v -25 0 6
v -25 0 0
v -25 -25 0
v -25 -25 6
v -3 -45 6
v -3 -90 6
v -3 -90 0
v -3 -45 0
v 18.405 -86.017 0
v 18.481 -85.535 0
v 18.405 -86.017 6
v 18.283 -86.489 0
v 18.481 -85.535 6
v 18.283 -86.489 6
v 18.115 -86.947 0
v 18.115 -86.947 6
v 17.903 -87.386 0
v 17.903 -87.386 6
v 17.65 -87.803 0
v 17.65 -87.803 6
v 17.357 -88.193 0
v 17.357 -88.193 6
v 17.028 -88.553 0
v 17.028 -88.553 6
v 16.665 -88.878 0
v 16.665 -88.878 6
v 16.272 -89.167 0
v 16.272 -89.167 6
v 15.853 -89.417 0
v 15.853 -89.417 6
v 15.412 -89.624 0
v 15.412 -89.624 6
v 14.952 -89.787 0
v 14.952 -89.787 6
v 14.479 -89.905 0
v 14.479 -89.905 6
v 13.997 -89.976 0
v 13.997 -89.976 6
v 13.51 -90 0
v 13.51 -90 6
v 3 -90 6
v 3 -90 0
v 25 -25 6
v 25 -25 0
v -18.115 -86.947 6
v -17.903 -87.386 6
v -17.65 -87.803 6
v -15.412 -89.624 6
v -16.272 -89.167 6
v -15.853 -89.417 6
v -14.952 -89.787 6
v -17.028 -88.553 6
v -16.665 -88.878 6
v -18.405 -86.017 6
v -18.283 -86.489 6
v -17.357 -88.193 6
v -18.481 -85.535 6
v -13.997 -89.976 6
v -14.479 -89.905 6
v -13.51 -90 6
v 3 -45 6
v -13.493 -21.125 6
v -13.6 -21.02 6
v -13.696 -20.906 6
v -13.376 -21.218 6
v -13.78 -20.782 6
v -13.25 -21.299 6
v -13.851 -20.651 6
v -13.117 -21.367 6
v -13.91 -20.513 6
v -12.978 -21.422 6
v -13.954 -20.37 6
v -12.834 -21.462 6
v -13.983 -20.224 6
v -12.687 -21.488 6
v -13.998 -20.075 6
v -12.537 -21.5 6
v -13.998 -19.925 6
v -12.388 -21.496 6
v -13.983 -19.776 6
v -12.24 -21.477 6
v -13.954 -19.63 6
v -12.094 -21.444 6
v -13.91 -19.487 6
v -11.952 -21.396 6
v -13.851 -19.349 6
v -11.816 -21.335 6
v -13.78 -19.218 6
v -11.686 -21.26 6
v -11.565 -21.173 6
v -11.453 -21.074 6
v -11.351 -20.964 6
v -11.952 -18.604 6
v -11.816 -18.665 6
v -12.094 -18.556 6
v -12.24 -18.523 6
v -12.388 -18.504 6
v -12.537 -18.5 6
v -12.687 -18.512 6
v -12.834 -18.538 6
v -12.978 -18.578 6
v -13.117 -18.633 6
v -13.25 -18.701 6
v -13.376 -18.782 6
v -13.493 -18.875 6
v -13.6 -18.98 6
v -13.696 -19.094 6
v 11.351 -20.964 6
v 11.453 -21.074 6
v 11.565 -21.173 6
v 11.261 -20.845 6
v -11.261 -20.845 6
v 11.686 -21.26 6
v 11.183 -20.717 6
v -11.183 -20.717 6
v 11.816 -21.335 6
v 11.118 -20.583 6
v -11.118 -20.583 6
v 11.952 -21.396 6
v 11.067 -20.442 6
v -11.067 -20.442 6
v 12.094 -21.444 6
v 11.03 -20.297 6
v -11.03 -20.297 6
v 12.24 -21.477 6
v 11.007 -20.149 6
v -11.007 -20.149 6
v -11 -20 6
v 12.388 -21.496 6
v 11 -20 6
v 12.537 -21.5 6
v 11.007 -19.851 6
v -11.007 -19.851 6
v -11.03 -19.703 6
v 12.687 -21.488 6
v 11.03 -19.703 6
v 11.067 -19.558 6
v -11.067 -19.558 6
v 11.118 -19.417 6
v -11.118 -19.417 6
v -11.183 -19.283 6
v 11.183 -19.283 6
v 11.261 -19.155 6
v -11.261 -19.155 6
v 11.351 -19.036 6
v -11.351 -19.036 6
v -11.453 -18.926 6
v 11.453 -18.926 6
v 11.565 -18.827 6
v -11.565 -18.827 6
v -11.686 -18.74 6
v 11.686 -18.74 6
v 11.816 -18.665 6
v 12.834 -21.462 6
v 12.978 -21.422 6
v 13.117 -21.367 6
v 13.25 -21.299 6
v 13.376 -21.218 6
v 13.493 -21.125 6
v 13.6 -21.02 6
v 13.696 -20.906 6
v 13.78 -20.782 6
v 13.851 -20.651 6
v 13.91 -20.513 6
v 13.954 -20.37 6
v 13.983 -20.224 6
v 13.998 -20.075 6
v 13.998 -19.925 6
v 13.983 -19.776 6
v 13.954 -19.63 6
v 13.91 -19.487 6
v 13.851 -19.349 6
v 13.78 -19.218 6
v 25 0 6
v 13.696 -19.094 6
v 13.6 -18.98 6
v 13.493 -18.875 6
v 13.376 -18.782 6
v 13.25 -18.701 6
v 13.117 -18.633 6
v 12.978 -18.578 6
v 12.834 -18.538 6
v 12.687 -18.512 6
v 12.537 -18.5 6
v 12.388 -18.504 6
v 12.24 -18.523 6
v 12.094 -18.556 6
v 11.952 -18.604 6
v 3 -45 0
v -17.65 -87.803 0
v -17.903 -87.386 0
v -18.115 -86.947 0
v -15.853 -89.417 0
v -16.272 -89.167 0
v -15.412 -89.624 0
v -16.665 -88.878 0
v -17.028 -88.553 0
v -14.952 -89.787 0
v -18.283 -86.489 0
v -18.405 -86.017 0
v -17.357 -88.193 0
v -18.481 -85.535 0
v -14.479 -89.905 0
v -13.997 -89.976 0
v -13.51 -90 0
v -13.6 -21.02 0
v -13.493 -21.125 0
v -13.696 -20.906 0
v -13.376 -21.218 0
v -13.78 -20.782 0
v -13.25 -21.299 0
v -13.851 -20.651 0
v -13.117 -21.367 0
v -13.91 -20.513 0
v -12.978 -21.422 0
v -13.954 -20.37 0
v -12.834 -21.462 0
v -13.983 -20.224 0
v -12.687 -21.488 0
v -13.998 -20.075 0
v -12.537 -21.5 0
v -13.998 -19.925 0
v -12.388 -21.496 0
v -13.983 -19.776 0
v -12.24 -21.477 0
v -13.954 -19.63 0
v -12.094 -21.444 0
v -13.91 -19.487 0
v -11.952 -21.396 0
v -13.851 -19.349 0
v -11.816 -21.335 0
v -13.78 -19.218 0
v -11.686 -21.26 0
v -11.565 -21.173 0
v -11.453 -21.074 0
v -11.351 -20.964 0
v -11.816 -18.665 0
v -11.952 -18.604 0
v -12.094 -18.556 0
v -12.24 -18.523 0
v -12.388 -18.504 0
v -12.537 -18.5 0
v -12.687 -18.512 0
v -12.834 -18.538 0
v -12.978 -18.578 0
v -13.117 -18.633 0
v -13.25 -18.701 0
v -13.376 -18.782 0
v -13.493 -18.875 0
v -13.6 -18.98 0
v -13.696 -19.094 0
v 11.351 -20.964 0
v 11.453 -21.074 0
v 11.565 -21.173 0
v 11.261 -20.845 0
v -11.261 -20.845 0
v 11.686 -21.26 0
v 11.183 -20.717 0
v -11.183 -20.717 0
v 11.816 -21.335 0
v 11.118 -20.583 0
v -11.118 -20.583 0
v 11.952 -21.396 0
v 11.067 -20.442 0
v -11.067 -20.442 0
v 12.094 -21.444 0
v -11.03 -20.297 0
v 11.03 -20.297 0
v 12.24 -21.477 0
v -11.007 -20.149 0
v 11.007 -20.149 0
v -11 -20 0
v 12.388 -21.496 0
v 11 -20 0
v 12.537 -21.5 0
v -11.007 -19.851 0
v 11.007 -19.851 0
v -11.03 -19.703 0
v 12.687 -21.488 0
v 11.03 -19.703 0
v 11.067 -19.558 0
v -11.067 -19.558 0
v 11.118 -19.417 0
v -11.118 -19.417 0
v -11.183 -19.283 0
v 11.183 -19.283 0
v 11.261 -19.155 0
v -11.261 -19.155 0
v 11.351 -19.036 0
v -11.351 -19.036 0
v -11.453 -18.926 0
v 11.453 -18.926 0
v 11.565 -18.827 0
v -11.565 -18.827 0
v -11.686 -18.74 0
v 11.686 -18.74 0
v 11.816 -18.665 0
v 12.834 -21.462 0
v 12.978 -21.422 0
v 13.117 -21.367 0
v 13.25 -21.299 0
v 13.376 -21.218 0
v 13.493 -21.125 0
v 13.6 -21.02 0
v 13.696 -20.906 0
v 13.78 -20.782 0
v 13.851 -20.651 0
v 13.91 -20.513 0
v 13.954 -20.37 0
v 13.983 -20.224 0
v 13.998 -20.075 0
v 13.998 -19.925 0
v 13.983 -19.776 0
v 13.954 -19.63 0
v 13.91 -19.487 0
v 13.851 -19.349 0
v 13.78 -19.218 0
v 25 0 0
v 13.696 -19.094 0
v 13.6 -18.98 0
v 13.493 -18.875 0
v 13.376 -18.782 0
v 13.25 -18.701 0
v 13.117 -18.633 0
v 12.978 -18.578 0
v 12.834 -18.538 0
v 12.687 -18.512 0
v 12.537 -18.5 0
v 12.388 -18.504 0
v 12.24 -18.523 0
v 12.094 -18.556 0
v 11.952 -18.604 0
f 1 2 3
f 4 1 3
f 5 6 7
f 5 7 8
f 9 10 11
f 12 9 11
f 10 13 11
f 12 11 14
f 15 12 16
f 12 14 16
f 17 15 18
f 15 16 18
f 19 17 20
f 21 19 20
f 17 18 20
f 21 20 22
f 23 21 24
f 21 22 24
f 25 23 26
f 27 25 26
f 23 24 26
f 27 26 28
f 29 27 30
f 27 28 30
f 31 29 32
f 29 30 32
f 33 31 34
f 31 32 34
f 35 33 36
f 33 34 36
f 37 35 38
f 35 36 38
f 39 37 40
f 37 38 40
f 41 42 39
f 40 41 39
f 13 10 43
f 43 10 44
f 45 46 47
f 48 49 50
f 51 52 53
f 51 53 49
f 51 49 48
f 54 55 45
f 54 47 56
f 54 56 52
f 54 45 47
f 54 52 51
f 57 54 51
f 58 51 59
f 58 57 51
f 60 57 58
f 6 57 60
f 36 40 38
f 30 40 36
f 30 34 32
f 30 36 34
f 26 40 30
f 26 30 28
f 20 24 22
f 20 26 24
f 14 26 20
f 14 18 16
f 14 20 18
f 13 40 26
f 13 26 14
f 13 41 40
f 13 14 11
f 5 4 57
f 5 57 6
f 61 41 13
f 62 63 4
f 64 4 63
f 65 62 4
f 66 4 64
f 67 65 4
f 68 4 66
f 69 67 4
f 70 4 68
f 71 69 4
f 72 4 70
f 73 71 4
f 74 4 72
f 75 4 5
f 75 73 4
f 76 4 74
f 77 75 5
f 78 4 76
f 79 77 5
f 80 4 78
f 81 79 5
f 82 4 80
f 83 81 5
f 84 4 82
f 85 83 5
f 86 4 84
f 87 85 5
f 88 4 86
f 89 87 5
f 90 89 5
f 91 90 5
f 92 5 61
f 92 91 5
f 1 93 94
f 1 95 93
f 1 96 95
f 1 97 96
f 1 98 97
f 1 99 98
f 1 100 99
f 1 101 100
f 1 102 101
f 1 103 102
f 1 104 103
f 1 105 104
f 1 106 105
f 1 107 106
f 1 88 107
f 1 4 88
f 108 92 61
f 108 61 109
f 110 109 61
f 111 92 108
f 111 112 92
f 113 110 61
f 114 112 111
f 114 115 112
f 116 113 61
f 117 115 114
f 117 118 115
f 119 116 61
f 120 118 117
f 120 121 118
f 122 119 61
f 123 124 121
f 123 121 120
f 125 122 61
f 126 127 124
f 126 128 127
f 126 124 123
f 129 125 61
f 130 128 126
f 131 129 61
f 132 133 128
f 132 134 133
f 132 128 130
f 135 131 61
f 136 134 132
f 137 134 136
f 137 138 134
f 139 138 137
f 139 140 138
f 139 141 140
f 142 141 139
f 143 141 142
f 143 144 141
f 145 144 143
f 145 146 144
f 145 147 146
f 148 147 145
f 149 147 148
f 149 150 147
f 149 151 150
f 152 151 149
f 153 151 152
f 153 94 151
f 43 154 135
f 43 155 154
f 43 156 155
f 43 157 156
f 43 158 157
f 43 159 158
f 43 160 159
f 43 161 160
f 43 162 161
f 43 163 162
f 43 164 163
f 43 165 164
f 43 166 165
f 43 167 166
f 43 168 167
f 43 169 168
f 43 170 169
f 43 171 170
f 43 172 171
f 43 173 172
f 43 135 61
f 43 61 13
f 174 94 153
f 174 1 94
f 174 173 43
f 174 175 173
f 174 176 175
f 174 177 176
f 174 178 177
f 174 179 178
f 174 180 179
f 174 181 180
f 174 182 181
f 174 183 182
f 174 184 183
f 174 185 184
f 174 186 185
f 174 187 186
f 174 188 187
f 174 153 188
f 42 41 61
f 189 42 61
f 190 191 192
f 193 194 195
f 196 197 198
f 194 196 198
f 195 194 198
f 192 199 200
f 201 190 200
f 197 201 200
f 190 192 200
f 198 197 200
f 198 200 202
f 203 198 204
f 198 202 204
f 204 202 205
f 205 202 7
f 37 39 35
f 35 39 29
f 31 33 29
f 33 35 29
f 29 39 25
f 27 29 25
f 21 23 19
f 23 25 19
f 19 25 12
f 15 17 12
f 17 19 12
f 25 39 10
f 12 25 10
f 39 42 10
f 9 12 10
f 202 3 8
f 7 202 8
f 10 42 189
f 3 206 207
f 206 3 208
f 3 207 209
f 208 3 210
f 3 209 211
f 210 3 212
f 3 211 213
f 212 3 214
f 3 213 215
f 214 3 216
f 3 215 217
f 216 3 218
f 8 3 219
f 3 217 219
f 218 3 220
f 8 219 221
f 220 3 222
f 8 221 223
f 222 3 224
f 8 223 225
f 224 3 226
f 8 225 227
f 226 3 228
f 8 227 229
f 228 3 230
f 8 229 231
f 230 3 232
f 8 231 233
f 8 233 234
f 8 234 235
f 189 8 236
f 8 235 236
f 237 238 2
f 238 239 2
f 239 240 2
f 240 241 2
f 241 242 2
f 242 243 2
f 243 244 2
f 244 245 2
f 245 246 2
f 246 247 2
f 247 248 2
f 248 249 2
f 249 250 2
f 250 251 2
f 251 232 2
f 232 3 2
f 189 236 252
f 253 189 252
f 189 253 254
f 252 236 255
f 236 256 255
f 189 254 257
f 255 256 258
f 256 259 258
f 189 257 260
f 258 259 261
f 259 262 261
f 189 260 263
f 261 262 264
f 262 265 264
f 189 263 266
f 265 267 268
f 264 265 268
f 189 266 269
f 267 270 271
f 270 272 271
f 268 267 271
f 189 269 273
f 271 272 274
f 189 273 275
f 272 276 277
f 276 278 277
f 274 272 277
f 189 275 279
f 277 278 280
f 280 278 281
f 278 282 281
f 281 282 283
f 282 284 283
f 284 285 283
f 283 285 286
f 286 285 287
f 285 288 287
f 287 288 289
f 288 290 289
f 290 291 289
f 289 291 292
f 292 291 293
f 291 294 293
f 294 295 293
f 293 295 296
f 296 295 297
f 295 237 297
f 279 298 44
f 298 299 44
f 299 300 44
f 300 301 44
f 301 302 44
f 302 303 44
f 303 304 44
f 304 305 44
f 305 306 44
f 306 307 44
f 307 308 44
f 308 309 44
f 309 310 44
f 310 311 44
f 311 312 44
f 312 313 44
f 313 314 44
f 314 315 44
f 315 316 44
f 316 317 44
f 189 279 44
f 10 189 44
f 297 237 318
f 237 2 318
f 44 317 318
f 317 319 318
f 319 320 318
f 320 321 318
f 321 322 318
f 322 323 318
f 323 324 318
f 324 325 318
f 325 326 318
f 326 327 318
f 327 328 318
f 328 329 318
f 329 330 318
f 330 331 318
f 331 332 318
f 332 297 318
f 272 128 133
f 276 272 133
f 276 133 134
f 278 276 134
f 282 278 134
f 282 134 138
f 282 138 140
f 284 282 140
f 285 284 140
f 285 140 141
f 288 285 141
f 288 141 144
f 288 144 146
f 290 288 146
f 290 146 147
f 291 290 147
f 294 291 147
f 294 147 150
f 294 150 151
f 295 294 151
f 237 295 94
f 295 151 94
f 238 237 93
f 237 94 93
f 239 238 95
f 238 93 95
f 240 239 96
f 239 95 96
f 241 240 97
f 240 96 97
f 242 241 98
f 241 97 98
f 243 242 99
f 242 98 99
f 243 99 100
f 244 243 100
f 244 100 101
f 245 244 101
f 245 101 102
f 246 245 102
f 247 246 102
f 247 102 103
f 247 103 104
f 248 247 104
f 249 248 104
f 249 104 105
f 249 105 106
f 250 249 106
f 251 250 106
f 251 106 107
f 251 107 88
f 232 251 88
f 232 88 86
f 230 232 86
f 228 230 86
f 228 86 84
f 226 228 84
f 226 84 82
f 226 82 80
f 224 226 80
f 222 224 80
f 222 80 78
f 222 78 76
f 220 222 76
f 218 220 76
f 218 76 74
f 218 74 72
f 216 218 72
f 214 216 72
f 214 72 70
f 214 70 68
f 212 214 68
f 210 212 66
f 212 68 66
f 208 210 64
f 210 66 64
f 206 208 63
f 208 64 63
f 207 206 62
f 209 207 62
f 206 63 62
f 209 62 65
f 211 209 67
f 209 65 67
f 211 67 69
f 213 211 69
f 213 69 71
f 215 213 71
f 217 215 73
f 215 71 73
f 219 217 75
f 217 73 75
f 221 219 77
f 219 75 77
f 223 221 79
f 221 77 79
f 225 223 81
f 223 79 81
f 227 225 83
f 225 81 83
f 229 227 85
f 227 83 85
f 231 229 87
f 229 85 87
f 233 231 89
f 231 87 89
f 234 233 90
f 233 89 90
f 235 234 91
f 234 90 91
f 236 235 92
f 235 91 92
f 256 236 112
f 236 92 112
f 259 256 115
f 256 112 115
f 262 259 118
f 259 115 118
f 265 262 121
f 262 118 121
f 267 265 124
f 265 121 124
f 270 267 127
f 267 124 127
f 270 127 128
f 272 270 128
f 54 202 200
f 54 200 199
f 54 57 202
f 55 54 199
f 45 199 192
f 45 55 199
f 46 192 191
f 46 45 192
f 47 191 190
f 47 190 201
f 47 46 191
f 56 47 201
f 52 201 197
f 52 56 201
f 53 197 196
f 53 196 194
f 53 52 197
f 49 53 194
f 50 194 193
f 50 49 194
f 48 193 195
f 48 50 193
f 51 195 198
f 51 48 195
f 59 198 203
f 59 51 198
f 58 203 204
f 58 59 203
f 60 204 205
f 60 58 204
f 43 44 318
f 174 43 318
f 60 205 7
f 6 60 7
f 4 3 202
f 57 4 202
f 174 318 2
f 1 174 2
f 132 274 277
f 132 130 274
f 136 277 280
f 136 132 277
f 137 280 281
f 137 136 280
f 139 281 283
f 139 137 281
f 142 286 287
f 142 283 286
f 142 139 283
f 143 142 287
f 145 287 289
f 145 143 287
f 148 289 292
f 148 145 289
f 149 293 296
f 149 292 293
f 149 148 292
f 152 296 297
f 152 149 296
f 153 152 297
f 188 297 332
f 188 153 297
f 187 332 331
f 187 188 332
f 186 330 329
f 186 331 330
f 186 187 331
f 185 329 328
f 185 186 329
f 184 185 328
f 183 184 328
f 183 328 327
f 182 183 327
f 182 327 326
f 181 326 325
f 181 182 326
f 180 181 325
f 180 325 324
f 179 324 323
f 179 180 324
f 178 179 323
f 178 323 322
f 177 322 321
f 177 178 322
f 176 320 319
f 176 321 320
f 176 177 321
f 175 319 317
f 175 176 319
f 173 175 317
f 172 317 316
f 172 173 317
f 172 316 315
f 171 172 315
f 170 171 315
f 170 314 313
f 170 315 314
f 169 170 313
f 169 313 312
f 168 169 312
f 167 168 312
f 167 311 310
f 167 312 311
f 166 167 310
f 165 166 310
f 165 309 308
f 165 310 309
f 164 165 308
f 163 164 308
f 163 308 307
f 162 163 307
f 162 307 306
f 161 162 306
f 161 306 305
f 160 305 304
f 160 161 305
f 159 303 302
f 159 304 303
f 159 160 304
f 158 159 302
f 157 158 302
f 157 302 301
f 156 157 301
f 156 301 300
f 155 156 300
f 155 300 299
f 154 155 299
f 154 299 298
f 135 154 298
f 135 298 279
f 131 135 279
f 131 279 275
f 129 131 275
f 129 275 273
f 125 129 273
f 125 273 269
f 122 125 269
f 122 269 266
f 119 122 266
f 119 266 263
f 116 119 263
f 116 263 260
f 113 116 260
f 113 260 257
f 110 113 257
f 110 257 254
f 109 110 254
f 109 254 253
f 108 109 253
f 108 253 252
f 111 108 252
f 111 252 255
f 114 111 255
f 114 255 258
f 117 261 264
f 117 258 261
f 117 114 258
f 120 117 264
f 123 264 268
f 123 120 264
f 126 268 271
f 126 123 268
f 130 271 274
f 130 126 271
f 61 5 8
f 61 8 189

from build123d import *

# Parameters (mm, degrees)
BOSS_EXTRUDE1_DEPTH     = 6
SKETCH3_W               = 6
SKETCH3_H               = 45
CUT_EXTRUDE1_DEPTH      = 1
CUT_EXTRUDE1_DEPTH_BACK = 7
FILLET1_R               = 5
CUT_EXTRUDE2_START      = -7
SKETCH4_R               = 1.5
CUT_EXTRUDE2_DEPTH      = 8


with BuildPart() as part:
    # Sketch1 → Boss-Extrude1 (new body)
    with BuildSketch(Plane.XY):
        Polygon((25, 0), (-25, 0), (-25, -25), (-18, -90), (18, -90), (25, -25), align=None)
    extrude(amount=BOSS_EXTRUDE1_DEPTH)

    # Sketch3 → Cut-Extrude1 (cut, two sides)
    with BuildSketch(Plane.XY.offset(6)) as cut_extrude1_sk:
        with Locations((0, -67.5)):
            Rectangle(SKETCH3_W, SKETCH3_H)
    extrude(amount=CUT_EXTRUDE1_DEPTH, mode=Mode.SUBTRACT)
    extrude(cut_extrude1_sk.sketch, amount=-CUT_EXTRUDE1_DEPTH_BACK, mode=Mode.SUBTRACT)

    # Fillet1
    fillet1_edges = [part.edges().sort_by_distance(p)[0] for p in [
        (18, -90, 3),
        (-18, -90, 3),
    ]]
    fillet(fillet1_edges, radius=FILLET1_R)

    # Sketch4 → Cut-Extrude2 (cut)
    with BuildSketch(Plane(origin=(0, 0, 0), x_dir=(-1, 0, 0), z_dir=(0, 0, -1)).offset(CUT_EXTRUDE2_START)):
        with Locations((-12.5, -20)):
            Circle(SKETCH4_R)
    cut_extrude2 = extrude(amount=CUT_EXTRUDE2_DEPTH, mode=Mode.SUBTRACT)

    # Mirror1: Cut-Extrude2 across plane
    add(cut_extrude2.mirror(Plane(origin=(0, 0, 0), x_dir=(0, 0, 1), z_dir=(1, 0, 0))), mode=Mode.SUBTRACT)


solid = part.part
